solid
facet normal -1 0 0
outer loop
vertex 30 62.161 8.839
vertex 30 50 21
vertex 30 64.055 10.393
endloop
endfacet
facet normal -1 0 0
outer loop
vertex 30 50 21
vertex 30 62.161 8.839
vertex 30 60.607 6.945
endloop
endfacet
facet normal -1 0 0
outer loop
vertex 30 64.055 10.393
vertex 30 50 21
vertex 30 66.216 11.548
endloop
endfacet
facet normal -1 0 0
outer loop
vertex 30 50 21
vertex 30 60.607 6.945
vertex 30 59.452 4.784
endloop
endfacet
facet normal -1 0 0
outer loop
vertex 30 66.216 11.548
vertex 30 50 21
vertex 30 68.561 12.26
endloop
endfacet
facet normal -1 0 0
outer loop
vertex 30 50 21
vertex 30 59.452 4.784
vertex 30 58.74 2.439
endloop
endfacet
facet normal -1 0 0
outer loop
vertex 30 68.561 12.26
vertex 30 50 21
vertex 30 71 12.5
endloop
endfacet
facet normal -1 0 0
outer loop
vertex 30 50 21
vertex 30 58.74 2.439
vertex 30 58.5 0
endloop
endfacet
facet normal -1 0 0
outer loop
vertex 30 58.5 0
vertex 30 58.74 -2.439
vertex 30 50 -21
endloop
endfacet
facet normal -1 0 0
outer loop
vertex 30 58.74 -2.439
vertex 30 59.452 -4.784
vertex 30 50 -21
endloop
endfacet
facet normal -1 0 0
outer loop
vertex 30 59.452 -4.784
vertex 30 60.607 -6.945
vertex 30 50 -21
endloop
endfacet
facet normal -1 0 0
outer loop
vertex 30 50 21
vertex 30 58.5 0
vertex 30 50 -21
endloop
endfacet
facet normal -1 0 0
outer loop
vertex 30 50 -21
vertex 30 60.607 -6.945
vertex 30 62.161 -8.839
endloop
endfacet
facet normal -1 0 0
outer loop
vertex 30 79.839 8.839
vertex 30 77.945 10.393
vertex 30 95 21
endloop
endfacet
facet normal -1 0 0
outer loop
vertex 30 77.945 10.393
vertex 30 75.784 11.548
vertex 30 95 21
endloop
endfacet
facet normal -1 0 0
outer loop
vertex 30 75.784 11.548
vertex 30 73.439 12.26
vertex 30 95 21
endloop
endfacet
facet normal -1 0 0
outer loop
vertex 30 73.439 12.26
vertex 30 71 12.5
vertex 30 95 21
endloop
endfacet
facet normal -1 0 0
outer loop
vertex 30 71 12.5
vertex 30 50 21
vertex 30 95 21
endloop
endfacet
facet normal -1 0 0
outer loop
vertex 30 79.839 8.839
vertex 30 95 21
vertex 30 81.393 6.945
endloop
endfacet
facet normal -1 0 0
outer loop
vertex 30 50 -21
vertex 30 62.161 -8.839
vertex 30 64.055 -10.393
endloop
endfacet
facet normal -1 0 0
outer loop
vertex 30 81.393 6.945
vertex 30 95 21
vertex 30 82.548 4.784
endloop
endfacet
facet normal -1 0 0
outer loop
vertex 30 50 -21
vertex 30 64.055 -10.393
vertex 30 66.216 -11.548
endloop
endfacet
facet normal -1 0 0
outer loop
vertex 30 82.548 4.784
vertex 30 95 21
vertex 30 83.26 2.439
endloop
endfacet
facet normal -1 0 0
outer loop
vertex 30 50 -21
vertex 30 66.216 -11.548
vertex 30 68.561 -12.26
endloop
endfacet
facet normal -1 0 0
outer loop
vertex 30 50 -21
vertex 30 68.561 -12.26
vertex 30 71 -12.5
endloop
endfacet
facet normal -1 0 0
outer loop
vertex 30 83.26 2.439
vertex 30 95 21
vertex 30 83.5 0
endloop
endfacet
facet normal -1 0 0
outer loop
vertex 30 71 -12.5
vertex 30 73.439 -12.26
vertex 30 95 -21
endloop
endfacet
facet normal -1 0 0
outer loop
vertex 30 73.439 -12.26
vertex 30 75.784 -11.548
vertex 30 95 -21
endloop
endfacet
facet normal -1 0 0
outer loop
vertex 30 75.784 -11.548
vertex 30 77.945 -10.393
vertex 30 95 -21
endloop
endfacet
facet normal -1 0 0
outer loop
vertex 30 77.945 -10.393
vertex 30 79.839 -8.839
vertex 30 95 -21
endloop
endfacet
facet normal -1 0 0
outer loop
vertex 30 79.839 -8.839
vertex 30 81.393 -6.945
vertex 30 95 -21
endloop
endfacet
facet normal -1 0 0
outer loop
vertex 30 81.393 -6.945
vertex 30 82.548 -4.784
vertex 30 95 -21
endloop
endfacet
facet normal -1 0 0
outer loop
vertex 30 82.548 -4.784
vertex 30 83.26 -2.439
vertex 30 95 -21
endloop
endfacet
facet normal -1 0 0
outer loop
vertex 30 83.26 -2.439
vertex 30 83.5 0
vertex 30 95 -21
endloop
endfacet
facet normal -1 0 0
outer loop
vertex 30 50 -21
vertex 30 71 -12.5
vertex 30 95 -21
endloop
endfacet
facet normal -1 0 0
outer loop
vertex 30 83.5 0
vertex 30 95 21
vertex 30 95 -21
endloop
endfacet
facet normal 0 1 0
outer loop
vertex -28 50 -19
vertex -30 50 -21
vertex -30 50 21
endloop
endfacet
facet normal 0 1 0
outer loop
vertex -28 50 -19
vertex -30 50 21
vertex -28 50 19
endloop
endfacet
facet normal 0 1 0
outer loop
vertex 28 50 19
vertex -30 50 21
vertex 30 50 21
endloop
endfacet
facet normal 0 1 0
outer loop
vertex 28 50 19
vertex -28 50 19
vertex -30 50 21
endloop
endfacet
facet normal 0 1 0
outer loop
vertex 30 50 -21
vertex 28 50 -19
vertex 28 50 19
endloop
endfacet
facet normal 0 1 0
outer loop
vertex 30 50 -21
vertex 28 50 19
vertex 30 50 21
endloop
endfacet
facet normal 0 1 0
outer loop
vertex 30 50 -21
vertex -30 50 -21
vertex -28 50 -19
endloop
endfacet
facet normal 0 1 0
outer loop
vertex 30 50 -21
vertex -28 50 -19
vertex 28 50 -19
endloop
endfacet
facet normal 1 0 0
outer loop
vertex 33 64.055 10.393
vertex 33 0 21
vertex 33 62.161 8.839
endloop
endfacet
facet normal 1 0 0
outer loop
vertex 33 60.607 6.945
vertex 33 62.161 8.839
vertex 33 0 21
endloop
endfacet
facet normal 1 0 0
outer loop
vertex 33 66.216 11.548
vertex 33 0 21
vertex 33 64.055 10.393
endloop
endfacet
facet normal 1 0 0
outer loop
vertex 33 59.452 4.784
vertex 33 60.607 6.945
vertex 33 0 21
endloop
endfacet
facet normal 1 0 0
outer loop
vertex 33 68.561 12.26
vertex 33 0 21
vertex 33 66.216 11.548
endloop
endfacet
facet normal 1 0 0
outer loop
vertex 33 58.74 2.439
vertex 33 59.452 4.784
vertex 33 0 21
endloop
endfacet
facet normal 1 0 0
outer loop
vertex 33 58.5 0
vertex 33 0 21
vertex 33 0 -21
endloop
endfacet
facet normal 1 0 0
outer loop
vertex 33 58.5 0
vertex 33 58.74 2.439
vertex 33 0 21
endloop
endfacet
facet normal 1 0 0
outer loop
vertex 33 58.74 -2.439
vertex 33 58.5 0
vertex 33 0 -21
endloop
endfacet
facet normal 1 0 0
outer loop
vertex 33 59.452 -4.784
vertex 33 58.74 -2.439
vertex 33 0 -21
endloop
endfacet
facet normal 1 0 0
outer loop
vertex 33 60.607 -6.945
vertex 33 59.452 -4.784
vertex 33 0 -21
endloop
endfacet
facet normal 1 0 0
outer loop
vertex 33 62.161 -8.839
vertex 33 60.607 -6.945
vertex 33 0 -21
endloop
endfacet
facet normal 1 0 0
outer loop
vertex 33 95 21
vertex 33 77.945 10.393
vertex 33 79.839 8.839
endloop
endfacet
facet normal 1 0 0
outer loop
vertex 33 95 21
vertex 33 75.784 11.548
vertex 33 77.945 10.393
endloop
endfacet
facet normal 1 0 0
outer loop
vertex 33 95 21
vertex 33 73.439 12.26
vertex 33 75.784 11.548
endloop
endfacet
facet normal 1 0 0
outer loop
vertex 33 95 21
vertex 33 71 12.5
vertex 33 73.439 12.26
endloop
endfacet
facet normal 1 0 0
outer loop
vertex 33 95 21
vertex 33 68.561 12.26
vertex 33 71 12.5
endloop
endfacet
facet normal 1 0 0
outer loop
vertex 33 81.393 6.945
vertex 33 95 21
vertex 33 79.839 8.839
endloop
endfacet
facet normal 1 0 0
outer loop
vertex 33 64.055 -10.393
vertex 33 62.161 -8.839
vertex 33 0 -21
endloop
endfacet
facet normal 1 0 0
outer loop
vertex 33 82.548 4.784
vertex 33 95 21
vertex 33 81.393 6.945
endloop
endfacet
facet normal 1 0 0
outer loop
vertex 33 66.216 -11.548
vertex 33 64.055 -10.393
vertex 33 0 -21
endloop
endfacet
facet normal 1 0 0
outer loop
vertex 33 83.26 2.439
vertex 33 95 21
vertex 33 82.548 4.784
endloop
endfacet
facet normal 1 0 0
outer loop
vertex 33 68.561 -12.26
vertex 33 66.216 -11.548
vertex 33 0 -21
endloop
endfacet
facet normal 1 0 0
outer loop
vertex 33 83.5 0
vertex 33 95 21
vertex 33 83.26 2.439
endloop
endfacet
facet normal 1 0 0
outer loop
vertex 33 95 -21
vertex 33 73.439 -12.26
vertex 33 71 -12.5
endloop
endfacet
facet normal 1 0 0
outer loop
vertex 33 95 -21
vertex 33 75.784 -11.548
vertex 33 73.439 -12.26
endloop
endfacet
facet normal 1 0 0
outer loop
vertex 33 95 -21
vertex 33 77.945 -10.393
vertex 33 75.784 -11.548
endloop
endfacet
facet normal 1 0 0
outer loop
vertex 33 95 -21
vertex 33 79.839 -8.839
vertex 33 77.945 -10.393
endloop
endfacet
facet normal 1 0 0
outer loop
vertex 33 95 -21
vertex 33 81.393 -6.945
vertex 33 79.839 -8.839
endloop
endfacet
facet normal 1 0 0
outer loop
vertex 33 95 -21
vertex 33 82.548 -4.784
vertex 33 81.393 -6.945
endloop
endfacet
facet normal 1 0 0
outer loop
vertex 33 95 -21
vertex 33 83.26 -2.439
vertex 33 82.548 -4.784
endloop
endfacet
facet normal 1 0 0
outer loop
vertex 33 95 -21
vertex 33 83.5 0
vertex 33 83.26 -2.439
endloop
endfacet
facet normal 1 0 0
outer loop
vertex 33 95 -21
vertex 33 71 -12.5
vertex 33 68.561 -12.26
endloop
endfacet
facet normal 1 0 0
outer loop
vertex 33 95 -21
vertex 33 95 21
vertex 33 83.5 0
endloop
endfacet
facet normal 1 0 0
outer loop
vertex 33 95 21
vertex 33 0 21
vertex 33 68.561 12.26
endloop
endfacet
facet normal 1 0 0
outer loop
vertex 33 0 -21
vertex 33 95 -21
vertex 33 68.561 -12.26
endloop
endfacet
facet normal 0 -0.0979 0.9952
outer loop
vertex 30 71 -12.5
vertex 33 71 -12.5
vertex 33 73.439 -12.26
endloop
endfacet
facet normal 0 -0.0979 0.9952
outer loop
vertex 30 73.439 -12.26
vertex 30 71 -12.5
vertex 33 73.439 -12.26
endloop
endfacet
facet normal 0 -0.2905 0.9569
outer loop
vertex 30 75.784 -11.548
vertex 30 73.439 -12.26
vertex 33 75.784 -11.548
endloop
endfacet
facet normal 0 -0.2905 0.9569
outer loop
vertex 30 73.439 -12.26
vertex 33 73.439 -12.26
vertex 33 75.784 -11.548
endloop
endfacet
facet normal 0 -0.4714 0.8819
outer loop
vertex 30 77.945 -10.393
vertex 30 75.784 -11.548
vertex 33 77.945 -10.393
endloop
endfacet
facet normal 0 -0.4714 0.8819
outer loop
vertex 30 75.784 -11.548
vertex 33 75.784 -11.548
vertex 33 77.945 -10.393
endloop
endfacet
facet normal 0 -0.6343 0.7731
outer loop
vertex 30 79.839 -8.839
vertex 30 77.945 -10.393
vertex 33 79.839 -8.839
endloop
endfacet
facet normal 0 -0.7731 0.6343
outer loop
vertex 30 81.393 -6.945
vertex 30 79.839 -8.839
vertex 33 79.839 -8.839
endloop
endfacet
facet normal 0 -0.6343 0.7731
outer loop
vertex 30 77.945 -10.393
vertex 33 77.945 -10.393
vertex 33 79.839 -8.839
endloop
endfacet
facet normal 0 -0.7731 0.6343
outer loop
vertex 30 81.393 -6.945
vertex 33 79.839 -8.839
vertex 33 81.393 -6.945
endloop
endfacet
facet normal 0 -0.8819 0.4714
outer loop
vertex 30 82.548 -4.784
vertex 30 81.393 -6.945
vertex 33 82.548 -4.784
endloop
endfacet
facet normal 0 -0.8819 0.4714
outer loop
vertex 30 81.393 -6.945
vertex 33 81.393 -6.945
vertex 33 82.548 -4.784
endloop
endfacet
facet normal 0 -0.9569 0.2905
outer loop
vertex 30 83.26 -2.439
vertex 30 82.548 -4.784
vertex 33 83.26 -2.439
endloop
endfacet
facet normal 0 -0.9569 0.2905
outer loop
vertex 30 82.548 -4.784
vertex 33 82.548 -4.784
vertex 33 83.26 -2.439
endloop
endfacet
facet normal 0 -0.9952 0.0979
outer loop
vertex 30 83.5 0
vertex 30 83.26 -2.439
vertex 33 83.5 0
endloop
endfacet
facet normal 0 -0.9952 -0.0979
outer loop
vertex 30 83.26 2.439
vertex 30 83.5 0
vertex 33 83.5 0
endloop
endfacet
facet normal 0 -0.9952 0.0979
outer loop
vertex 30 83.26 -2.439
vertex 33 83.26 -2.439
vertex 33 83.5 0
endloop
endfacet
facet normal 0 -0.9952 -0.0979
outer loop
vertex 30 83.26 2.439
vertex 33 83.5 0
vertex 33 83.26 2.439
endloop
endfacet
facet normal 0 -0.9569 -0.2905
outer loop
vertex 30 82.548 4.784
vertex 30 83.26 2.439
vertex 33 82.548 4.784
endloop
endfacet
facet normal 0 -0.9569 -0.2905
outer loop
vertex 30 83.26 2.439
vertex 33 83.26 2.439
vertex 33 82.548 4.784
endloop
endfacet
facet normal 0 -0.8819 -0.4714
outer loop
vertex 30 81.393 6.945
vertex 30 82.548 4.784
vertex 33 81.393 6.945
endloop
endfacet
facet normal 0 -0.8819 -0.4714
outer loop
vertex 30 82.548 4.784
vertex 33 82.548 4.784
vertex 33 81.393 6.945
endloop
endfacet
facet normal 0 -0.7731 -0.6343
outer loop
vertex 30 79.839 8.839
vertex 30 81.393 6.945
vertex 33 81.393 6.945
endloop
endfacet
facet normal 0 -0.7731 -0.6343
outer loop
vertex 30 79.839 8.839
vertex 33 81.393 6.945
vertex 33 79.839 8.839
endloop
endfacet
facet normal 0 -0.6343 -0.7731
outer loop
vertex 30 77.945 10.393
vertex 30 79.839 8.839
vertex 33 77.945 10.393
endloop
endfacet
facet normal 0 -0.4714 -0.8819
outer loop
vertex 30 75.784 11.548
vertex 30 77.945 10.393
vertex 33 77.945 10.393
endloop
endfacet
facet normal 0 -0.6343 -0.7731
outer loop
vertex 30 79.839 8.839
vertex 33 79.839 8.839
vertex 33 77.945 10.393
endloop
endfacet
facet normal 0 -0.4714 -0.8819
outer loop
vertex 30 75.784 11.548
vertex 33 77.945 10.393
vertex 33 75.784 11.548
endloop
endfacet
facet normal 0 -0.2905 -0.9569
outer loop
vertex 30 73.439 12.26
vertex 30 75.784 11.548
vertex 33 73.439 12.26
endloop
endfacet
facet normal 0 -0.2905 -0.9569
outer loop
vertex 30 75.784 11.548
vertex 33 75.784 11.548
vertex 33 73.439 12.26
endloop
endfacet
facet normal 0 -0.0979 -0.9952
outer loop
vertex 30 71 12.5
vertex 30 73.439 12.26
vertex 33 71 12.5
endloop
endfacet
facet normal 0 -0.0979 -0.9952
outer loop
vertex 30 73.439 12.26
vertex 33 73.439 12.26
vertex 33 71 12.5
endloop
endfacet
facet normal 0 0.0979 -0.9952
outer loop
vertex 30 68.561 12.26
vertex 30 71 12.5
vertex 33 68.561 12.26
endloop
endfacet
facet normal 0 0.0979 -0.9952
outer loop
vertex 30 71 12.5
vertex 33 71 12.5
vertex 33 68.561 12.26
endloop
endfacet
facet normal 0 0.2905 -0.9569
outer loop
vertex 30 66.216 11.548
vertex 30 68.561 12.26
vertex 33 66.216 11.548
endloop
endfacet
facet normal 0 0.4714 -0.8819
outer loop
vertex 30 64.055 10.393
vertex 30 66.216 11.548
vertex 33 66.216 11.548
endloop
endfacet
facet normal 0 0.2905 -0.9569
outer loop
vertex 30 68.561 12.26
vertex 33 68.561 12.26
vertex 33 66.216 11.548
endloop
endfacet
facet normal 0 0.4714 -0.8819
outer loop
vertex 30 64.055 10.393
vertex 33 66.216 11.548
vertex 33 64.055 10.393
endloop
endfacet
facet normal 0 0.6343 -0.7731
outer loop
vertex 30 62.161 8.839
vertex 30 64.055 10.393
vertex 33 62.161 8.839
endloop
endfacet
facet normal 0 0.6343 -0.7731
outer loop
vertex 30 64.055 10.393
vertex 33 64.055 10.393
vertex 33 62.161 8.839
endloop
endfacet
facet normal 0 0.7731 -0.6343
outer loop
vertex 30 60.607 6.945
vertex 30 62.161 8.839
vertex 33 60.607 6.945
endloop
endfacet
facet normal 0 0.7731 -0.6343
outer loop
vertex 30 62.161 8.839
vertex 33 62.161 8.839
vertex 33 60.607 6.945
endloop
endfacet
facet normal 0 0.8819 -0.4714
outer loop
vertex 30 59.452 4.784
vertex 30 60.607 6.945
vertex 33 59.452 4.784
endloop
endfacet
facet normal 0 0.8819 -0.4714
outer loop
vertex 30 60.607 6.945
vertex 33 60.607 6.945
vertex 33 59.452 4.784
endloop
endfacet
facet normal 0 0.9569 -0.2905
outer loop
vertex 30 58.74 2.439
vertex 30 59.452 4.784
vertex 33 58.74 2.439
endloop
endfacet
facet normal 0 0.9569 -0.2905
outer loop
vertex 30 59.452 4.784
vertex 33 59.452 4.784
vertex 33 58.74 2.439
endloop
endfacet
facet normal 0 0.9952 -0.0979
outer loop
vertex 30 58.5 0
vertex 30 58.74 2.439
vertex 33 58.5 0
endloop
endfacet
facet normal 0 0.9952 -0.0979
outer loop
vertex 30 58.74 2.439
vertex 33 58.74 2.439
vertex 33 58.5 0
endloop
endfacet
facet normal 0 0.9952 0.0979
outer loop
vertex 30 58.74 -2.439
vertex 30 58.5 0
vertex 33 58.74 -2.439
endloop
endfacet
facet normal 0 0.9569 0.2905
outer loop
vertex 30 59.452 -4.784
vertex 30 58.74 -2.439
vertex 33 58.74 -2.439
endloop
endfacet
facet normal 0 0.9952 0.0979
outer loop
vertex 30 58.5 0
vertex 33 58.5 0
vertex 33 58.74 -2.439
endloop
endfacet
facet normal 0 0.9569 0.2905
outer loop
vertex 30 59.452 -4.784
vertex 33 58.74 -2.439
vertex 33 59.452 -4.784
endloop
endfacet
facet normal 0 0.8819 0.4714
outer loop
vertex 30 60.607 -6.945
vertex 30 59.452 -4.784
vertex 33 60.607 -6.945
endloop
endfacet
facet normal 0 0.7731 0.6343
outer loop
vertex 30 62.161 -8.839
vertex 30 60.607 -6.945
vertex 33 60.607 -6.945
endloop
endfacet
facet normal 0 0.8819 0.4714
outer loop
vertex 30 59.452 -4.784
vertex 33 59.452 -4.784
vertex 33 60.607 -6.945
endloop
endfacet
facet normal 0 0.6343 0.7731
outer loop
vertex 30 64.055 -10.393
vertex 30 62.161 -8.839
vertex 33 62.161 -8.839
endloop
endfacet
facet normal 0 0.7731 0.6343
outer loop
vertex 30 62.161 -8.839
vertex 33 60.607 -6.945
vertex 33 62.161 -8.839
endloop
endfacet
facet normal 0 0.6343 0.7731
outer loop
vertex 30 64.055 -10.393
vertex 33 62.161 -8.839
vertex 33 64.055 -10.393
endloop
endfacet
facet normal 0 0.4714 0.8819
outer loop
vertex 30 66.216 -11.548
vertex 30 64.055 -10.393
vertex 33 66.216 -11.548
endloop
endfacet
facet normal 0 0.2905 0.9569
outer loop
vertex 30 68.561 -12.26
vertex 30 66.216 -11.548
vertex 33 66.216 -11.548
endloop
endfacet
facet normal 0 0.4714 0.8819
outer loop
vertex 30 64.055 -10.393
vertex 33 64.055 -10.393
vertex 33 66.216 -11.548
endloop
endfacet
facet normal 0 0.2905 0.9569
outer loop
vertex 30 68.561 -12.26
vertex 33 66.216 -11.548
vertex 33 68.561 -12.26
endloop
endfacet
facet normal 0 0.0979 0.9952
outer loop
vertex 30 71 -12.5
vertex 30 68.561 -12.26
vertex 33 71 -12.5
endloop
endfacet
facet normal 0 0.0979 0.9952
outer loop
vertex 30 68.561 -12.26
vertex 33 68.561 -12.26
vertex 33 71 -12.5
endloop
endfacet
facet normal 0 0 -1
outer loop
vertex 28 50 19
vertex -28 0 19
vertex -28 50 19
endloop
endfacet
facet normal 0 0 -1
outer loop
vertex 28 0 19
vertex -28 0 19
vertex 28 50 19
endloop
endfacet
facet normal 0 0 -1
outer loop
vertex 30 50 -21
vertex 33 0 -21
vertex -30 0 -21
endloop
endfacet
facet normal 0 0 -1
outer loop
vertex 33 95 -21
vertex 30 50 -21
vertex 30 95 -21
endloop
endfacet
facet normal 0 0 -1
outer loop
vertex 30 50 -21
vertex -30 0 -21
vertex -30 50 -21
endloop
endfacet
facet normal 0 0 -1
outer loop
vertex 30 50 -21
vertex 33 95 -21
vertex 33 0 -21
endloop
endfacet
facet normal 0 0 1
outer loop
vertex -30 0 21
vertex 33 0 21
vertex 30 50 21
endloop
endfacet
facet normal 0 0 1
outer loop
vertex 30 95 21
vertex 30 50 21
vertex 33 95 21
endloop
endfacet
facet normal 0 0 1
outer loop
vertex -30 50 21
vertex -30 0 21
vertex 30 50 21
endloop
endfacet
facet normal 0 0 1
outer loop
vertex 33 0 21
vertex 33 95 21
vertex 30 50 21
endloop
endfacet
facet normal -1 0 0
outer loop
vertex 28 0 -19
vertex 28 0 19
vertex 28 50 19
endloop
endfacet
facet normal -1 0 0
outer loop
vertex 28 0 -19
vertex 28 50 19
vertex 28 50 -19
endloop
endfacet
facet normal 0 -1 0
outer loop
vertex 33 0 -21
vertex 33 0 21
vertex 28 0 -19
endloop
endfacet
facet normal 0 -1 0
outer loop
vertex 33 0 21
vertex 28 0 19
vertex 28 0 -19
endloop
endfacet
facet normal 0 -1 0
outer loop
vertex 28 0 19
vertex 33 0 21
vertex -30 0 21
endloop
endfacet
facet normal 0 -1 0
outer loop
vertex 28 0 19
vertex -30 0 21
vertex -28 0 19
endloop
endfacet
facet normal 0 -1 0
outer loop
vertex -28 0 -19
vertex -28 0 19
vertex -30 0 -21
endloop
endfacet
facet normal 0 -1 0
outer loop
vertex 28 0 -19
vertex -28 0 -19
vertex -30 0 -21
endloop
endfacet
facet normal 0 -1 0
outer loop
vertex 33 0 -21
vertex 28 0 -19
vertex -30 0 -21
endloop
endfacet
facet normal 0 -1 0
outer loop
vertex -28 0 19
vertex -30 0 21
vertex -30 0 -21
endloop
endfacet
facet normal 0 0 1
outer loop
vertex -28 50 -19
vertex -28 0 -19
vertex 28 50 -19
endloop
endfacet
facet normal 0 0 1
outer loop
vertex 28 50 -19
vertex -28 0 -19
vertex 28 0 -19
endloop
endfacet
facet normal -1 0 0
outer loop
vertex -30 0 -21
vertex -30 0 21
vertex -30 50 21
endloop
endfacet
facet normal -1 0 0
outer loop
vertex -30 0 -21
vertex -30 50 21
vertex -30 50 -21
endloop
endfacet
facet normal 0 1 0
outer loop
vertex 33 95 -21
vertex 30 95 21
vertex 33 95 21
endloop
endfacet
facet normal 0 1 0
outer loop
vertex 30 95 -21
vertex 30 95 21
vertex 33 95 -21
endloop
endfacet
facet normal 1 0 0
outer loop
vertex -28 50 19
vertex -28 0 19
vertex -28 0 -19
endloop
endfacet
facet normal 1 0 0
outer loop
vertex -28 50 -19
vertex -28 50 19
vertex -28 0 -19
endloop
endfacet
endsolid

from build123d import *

# Parameters (mm, degrees)
SKETCH1_W           = 60
SKETCH1_H           = 42
SKETCH1_W_2         = 56
SKETCH1_H_2         = 38
BOSS_EXTRUDE1_DEPTH = 50
SKETCH2_W           = 42
SKETCH2_H           = 95
BOSS_EXTRUDE2_DEPTH = 3
SKETCH3_R           = 12.5
CUT_EXTRUDE1_DEPTH  = 3


with BuildPart() as part:
    # Sketch1 → Boss-Extrude1 (new body)
    with BuildSketch(Plane(origin=(0, 0, 0), x_dir=(1, 0, 0), z_dir=(0, 1, 0))):
        Rectangle(SKETCH1_W, SKETCH1_H)
        Rectangle(SKETCH1_W_2, SKETCH1_H_2, mode=Mode.SUBTRACT)
    extrude(amount=BOSS_EXTRUDE1_DEPTH)

    # Sketch2 → Boss-Extrude2 (add)
    with BuildSketch(Plane(origin=(30, 0, 0), x_dir=(0, 0, -1), z_dir=(1, 0, 0))):
        with Locations((0, 47.5)):
            Rectangle(SKETCH2_W, SKETCH2_H)
    extrude(amount=BOSS_EXTRUDE2_DEPTH)

    # Sketch3 → Cut-Extrude1 (cut)
    with BuildSketch(Plane(origin=(33, 0, 0), x_dir=(0, 0, -1), z_dir=(1, 0, 0))):
        with Locations((0, 71)):
            Circle(SKETCH3_R)
    extrude(amount=-CUT_EXTRUDE1_DEPTH, mode=Mode.SUBTRACT)


solid = part.part
